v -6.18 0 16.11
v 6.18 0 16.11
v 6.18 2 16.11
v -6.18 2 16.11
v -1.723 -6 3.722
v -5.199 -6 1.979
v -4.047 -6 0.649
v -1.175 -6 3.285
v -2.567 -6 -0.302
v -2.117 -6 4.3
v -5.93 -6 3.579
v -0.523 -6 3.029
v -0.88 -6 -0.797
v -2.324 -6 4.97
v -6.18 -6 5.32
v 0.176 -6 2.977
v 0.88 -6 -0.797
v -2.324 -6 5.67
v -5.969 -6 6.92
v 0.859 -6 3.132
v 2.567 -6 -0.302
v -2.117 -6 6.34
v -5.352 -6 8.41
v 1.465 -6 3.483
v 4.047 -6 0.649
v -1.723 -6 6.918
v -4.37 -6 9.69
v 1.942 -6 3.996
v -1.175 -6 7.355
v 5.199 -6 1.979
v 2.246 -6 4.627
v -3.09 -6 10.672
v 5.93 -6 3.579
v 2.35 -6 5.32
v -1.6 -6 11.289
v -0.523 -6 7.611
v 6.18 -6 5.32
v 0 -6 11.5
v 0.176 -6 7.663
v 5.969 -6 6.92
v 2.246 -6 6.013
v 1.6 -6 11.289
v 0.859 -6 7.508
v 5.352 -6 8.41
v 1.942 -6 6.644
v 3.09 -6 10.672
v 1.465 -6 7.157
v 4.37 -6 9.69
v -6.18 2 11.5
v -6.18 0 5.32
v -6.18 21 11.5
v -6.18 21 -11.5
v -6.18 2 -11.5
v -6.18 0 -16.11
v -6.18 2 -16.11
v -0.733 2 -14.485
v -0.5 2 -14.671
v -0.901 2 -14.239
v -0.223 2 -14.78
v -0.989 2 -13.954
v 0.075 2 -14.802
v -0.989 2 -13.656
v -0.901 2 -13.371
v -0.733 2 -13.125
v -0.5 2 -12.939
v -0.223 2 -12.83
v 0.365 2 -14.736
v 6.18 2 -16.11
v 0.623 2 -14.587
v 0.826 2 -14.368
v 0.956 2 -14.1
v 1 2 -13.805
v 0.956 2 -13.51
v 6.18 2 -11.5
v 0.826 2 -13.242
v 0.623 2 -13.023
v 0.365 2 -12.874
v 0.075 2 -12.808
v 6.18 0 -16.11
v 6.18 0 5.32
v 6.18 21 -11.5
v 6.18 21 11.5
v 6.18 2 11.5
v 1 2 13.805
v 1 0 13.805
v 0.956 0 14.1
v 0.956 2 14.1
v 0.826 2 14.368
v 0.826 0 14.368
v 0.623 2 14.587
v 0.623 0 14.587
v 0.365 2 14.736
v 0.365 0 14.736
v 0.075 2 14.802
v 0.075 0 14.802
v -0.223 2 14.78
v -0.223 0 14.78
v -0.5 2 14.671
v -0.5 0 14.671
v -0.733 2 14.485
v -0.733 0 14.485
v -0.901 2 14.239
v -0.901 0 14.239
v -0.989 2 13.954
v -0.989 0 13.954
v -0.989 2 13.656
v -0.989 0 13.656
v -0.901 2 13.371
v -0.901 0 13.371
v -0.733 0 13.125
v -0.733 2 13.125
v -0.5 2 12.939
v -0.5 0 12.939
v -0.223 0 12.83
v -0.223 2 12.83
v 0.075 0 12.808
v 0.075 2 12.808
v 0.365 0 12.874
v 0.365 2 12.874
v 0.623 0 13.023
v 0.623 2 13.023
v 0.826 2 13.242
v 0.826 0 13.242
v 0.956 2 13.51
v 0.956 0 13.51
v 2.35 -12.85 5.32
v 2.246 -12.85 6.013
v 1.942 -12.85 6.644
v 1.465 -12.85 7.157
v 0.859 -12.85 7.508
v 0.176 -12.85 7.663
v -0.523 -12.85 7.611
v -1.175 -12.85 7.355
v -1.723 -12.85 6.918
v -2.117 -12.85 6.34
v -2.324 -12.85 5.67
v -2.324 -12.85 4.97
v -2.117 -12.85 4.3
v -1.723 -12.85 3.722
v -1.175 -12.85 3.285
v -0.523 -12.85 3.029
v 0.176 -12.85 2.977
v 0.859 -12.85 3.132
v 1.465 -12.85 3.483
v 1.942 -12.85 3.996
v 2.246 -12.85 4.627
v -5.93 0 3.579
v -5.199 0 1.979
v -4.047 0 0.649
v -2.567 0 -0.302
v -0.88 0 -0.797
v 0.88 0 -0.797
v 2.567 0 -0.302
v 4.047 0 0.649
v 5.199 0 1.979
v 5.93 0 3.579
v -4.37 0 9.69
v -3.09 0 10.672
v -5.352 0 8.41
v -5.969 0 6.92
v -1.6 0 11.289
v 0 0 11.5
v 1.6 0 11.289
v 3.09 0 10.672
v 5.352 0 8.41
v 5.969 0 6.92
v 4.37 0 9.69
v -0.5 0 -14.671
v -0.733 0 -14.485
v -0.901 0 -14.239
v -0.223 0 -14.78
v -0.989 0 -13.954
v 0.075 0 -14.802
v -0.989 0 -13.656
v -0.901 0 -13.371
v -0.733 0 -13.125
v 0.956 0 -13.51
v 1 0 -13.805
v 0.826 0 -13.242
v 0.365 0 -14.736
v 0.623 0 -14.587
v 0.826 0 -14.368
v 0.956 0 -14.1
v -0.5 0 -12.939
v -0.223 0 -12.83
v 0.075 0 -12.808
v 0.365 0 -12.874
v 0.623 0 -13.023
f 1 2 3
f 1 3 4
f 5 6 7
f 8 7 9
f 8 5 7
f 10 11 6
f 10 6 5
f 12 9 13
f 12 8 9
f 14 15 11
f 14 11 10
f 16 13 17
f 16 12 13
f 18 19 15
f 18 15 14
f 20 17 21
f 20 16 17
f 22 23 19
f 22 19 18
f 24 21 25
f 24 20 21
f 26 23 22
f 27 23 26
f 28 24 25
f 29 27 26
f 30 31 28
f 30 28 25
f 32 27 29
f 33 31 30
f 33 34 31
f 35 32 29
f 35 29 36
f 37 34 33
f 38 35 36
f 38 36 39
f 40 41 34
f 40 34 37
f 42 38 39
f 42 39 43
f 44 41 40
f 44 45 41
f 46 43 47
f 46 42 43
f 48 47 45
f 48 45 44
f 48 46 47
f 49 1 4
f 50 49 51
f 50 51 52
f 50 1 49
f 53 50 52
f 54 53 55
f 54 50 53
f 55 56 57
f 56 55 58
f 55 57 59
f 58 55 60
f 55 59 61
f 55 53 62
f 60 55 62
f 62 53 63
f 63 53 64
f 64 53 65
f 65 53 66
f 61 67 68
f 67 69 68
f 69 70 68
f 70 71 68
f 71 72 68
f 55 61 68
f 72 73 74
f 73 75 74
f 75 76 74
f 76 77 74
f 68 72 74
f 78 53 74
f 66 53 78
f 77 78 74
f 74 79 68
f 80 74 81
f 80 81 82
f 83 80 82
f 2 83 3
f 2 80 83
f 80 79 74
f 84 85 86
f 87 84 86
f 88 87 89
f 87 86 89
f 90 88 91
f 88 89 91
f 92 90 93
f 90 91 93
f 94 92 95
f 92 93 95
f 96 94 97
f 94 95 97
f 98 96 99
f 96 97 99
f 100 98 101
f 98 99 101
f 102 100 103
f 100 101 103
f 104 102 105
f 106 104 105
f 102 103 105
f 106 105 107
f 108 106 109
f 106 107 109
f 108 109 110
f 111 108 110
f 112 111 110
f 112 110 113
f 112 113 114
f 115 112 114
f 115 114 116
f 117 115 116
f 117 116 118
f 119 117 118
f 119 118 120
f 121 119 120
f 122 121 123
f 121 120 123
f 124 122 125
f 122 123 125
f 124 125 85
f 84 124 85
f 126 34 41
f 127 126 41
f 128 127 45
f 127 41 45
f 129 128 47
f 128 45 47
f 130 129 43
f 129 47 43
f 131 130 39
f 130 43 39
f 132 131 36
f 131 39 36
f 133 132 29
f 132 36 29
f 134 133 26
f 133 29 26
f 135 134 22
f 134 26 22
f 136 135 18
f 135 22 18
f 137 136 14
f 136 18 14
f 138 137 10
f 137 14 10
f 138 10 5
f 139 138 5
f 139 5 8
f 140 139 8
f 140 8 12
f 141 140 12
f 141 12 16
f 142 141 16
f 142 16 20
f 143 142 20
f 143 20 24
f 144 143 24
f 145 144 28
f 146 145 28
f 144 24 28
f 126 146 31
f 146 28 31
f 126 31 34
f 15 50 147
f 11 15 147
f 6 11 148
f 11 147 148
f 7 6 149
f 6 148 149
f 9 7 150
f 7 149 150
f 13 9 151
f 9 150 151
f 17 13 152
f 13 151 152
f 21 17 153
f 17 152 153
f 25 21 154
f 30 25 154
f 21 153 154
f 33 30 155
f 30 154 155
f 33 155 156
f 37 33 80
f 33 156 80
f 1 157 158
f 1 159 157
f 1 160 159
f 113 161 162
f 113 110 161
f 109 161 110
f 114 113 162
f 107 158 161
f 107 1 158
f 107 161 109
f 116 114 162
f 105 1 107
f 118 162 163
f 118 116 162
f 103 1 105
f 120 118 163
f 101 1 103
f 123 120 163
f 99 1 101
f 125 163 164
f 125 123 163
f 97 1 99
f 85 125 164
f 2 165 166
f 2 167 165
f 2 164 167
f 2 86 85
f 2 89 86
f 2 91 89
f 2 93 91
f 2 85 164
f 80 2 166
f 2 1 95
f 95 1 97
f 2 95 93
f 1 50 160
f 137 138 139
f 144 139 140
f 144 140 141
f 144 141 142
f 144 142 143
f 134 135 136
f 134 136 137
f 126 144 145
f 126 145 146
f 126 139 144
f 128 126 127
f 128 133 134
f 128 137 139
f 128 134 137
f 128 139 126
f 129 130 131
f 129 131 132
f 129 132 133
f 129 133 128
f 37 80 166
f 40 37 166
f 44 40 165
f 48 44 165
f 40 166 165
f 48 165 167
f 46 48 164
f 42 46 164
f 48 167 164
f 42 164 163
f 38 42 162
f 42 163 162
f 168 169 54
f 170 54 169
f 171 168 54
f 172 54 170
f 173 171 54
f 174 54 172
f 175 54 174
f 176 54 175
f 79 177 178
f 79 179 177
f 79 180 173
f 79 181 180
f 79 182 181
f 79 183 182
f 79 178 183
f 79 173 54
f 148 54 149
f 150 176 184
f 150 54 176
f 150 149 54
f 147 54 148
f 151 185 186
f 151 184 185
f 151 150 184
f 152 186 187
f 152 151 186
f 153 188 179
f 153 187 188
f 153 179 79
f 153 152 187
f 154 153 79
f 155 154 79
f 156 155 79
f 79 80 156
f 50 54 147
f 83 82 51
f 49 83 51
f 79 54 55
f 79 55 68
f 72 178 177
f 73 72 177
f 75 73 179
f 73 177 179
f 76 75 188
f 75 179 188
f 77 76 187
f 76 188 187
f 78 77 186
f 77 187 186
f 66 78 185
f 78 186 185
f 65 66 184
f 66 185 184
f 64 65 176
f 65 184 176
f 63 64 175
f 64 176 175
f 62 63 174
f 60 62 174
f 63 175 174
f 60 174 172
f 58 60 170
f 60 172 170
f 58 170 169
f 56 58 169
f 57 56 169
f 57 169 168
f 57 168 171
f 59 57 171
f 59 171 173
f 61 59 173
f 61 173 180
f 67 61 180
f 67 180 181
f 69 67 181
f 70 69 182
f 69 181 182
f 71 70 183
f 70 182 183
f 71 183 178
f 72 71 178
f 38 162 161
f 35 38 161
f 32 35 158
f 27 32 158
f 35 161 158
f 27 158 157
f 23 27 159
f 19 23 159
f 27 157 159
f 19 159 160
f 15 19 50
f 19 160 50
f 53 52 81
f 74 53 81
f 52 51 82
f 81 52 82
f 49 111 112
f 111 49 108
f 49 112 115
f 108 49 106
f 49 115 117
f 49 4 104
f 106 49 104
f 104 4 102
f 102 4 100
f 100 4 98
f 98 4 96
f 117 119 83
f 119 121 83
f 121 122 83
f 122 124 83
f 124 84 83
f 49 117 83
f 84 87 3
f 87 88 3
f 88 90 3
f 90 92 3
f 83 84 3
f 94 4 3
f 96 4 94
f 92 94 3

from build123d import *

# Parameters (mm, degrees)
F1_DEPTH = 21
F0_R     = 1
F0_W     = 12.36
F0_H     = 4.61
F2_DEPTH = 2
F3_DEPTH = 6
F4_R     = 2.35
F5_DEPTH = 6.85


with BuildPart() as f1:
    # F0 (on Front) → F1 (new body)
    with BuildSketch(Plane.XZ):
        with BuildLine():
            Line((0, 11.5), (-6.18, 11.5))
            Line((-6.18, 11.5), (-6.18, 5.32))
            ThreePointArc((-6.18, 5.32), (-4.3699199077, 9.6899199077), (0, 11.5))
        make_face()
        with BuildLine():
            ThreePointArc((6.18, 5.32), (0, -0.86), (-6.18, 5.32))
            Line((-6.18, 5.32), (-6.18, -11.5))
            Line((-6.18, -11.5), (6.18, -11.5))
            Line((6.18, -11.5), (6.18, 5.32))
        make_face()
        with BuildLine():
            Line((6.18, 5.32), (6.18, 11.5))
            Line((6.18, 11.5), (0, 11.5))
            ThreePointArc((0, 11.5), (4.3699199077, 9.6899199077), (6.18, 5.32))
        make_face()
        with BuildLine():
            ThreePointArc((0, 11.5), (-4.3699199077, 9.6899199077), (-6.18, 5.32))
            ThreePointArc((-6.18, 5.32), (0, -0.86), (6.18, 5.32))
            ThreePointArc((6.18, 5.32), (4.3699199077, 9.6899199077), (0, 11.5))
        make_face()
    extrude(amount=-F1_DEPTH)

    # F0 (on Front) → F2 (join)
    with BuildSketch(Plane.XZ):
        Polygon((6.18, 16.11), (-6.18, 16.11), (-6.18, 11.5), (0, 11.5), (6.18, 11.5), align=None)
        with Locations((0, 13.805)):
            Circle(F0_R, mode=Mode.SUBTRACT)
        with Locations((0, -13.805)):
            Rectangle(F0_W, F0_H)
        with Locations((0, -13.805)):
            Circle(F0_R, mode=Mode.SUBTRACT)
    extrude(amount=-F2_DEPTH)

    # F0 (on Front) → F3 (join)
    with BuildSketch(Plane.XZ):
        with BuildLine():
            ThreePointArc((0, 11.5), (-4.3699199077, 9.6899199077), (-6.18, 5.32))
            ThreePointArc((-6.18, 5.32), (0, -0.86), (6.18, 5.32))
            ThreePointArc((6.18, 5.32), (4.3699199077, 9.6899199077), (0, 11.5))
        make_face()
    extrude(amount=F3_DEPTH)

    # F4 (on face) → F5 (join)
    with BuildSketch(Plane.XZ.offset(6)):
        with Locations((0, 5.32)):
            Circle(F4_R)
    extrude(amount=F5_DEPTH)


solid = f1.part
